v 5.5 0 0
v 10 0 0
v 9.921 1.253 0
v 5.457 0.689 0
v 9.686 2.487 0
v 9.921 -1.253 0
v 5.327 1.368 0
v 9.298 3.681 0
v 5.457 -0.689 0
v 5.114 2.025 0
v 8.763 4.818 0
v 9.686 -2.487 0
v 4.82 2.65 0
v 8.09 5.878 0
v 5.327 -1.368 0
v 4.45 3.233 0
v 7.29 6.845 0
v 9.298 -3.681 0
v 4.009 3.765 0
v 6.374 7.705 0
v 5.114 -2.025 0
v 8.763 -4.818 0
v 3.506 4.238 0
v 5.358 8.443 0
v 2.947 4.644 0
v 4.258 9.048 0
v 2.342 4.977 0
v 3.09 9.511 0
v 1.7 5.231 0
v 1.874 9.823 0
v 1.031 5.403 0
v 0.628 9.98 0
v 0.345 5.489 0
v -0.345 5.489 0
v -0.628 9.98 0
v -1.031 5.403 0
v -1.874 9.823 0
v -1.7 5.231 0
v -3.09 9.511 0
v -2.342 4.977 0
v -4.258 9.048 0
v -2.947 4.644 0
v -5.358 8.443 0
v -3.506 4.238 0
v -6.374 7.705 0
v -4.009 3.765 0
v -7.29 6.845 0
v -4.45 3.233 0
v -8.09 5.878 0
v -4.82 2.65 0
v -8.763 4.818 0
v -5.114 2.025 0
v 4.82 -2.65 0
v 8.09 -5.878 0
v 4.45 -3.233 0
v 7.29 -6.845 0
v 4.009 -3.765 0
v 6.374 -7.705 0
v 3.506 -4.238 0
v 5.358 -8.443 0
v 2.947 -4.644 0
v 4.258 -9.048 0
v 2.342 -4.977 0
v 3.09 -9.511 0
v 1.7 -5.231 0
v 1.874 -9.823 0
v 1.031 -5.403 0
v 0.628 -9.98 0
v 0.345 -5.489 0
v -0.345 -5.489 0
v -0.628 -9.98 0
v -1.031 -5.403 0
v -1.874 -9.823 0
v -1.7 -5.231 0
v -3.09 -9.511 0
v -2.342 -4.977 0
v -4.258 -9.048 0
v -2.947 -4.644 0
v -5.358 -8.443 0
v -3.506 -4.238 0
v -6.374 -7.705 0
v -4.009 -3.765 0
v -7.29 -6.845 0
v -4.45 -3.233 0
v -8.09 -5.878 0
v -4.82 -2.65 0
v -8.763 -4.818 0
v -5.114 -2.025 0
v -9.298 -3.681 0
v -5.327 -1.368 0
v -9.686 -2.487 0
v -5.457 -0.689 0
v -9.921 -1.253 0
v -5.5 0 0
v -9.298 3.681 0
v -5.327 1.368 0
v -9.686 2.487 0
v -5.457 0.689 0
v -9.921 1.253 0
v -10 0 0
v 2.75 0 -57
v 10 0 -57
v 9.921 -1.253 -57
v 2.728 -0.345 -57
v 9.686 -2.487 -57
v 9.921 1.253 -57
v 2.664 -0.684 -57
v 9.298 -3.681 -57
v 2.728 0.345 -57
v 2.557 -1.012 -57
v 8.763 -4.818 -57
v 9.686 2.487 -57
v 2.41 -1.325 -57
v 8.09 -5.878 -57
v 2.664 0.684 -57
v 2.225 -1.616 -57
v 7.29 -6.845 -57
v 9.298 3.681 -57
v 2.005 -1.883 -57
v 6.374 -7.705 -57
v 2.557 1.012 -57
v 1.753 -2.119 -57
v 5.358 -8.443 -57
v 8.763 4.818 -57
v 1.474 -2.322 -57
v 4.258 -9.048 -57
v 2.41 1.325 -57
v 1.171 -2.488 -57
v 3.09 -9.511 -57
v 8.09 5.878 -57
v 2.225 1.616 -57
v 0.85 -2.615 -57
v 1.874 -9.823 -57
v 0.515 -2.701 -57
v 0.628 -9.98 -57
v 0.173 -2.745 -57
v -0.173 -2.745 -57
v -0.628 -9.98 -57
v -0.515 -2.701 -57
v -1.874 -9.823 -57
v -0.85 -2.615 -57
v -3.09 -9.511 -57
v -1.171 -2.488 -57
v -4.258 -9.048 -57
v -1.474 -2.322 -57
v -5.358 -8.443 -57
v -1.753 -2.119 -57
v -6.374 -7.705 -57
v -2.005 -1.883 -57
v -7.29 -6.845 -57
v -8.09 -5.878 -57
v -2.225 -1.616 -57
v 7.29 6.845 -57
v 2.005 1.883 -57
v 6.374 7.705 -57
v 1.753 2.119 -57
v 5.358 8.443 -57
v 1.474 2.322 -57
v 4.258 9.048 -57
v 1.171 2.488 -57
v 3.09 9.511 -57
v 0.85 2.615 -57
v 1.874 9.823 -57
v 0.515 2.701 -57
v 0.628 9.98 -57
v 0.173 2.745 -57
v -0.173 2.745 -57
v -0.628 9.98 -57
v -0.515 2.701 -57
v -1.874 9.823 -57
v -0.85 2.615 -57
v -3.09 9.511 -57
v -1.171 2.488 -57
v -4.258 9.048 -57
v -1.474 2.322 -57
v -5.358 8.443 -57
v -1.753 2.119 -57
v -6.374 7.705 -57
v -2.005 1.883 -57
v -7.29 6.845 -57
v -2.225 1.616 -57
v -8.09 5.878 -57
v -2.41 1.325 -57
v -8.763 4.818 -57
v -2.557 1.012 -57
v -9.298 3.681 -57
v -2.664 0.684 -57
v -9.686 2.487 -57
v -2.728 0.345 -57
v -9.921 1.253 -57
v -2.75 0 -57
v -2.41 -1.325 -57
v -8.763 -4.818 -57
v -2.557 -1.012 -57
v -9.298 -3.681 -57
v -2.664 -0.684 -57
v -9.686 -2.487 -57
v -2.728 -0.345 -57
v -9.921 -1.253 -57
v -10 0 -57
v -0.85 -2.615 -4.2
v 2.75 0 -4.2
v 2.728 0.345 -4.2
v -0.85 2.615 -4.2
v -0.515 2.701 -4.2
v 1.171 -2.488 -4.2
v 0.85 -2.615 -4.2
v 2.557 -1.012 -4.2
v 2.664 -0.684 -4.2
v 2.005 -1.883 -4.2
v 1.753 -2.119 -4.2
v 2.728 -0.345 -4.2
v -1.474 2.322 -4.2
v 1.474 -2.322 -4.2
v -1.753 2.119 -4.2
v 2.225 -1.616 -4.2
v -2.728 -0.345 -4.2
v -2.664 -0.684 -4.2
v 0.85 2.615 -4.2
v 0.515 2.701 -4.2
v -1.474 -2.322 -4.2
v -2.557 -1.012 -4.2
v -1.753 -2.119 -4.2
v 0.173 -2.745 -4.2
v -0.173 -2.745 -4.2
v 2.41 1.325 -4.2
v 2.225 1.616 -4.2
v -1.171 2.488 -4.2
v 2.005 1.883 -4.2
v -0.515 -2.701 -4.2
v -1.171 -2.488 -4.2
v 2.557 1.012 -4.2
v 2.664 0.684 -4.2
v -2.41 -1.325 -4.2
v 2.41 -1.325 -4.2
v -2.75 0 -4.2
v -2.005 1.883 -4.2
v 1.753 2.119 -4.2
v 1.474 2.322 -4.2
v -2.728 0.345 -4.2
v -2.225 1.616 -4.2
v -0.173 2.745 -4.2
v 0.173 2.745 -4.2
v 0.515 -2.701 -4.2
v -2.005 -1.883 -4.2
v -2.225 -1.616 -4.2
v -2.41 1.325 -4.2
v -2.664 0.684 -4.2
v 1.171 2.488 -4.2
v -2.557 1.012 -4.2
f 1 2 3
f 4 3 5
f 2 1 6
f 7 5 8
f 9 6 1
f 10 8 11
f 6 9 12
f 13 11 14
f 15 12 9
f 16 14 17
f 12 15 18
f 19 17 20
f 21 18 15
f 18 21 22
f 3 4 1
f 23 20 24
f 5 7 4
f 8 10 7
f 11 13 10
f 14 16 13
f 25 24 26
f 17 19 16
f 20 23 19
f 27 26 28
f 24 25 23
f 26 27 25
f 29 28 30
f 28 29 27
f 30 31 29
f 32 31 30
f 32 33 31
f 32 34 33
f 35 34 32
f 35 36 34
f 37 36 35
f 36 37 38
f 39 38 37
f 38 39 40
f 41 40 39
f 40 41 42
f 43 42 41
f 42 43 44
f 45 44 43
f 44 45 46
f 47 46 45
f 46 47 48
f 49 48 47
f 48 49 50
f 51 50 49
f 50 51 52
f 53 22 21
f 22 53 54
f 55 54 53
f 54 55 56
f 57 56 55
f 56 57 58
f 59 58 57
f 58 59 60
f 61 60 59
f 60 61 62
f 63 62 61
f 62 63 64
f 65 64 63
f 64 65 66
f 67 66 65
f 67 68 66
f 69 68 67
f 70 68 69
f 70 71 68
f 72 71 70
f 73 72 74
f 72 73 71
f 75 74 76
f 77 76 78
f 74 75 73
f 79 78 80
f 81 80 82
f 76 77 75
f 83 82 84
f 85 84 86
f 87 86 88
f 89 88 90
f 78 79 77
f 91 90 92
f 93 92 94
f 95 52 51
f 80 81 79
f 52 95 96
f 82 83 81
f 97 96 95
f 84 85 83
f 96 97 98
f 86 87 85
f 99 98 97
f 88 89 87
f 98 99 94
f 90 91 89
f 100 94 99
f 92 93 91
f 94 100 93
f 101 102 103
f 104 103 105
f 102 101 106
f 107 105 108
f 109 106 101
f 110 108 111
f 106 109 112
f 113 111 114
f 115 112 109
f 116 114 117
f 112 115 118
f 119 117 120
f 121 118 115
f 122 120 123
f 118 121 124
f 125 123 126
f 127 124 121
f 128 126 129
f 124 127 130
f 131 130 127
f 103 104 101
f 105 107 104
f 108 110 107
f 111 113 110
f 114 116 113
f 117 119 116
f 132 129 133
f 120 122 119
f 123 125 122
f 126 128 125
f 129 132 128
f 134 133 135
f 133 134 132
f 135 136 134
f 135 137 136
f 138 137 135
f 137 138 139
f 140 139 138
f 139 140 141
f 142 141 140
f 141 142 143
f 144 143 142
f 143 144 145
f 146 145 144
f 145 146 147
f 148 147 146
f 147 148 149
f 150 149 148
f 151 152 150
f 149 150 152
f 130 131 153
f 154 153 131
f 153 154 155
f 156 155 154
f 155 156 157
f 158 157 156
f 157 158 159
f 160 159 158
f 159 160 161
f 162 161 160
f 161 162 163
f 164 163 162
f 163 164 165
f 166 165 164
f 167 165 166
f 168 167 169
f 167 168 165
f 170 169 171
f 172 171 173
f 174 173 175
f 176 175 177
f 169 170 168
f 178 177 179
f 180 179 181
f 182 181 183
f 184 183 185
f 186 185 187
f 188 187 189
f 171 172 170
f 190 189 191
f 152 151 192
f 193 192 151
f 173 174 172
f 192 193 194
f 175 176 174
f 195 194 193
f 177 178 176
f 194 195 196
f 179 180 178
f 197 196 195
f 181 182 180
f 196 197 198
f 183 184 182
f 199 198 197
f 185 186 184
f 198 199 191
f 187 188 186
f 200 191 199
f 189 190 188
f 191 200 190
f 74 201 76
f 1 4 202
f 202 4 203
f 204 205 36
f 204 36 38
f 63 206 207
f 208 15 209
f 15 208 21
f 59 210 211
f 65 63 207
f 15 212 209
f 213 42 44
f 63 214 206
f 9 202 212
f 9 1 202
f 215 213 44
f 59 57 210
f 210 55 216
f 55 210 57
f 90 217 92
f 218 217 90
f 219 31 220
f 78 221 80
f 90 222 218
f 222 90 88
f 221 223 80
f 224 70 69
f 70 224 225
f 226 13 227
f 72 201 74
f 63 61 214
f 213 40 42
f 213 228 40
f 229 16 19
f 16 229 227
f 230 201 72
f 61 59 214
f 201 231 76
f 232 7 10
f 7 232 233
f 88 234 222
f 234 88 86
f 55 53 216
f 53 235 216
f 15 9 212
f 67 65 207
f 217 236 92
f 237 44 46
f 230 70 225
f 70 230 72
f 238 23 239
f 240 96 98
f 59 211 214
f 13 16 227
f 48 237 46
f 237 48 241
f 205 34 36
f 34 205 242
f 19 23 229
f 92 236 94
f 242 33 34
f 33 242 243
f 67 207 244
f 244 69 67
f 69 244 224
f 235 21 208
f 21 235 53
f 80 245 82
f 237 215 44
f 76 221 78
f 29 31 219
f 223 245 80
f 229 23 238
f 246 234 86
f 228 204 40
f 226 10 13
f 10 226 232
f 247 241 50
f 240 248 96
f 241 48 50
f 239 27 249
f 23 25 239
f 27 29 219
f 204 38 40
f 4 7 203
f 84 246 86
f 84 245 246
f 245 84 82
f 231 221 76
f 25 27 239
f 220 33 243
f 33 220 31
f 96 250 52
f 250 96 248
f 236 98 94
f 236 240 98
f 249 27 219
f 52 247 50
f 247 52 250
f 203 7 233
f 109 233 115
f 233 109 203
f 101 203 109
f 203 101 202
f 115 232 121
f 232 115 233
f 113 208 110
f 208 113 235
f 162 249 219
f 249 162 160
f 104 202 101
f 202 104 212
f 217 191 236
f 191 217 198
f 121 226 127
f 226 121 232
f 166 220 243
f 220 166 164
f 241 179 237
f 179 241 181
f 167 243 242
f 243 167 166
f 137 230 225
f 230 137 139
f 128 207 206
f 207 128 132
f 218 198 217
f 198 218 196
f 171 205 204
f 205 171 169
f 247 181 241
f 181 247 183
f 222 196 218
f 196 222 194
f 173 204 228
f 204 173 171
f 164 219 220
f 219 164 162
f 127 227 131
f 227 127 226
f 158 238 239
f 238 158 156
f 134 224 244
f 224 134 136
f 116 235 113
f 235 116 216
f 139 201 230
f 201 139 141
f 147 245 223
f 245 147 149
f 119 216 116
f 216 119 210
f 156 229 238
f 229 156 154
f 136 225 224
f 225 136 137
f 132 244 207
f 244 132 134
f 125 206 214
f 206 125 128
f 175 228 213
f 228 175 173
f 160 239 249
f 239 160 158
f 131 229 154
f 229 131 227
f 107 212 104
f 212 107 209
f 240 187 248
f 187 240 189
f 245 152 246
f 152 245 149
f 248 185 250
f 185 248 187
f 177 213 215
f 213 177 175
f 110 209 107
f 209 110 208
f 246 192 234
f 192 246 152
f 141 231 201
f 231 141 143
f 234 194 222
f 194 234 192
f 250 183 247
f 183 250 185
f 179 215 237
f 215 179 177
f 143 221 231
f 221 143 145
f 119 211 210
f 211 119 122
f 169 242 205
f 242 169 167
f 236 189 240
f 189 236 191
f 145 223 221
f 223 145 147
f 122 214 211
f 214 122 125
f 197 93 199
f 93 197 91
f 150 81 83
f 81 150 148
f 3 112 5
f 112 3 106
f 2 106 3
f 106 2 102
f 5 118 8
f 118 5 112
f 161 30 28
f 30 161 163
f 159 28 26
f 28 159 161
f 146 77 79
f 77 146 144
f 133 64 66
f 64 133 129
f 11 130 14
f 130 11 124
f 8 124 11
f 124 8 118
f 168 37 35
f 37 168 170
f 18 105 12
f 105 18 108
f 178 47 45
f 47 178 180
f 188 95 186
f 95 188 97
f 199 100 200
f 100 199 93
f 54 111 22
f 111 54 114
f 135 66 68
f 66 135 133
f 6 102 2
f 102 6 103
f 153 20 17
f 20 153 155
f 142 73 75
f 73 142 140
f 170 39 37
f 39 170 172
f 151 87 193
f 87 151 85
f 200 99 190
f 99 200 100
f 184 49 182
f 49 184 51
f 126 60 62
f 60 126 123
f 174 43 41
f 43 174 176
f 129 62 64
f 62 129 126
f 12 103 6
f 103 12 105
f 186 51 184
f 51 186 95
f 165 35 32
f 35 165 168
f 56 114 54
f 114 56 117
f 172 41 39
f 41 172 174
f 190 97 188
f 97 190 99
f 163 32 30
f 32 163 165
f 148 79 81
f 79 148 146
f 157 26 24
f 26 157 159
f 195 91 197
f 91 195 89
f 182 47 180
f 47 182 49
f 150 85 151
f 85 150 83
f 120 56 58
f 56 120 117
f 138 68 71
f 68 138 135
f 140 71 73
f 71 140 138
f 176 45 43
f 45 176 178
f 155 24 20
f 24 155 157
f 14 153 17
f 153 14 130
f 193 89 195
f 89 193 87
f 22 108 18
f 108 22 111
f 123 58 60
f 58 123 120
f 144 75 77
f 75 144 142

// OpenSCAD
$fn = 50;


difference() {
	union() {
		translate(v = [0, 0, -57.0000000000]) {
			cylinder(h = 57, r = 10.0000000000);
		}
		cylinder(h = 0, r = 13.0000000000);
	}
	union() {
		translate(v = [0, 0, 0]) {
			rotate(a = [0, 0, 0]) {
				difference() {
					union() {
						#translate(v = [0, 0, -57.0000000000]) {
							cylinder(h = 57, r = 2.2500000000);
						}
						#translate(v = [0, 0, -4.2000000000]) {
							cylinder(h = 4.2000000000, r = 10.0000000000, r1 = 2.7500000000, r2 = 5.5000000000);
						}
						#translate(v = [0, 0, -57.0000000000]) {
							cylinder(h = 57, r = 2.7500000000);
						}
						#translate(v = [0, 0, -57.0000000000]) {
							cylinder(h = 57, r = 2.2500000000);
						}
					}
					union();
				}
			}
		}
	}
}
